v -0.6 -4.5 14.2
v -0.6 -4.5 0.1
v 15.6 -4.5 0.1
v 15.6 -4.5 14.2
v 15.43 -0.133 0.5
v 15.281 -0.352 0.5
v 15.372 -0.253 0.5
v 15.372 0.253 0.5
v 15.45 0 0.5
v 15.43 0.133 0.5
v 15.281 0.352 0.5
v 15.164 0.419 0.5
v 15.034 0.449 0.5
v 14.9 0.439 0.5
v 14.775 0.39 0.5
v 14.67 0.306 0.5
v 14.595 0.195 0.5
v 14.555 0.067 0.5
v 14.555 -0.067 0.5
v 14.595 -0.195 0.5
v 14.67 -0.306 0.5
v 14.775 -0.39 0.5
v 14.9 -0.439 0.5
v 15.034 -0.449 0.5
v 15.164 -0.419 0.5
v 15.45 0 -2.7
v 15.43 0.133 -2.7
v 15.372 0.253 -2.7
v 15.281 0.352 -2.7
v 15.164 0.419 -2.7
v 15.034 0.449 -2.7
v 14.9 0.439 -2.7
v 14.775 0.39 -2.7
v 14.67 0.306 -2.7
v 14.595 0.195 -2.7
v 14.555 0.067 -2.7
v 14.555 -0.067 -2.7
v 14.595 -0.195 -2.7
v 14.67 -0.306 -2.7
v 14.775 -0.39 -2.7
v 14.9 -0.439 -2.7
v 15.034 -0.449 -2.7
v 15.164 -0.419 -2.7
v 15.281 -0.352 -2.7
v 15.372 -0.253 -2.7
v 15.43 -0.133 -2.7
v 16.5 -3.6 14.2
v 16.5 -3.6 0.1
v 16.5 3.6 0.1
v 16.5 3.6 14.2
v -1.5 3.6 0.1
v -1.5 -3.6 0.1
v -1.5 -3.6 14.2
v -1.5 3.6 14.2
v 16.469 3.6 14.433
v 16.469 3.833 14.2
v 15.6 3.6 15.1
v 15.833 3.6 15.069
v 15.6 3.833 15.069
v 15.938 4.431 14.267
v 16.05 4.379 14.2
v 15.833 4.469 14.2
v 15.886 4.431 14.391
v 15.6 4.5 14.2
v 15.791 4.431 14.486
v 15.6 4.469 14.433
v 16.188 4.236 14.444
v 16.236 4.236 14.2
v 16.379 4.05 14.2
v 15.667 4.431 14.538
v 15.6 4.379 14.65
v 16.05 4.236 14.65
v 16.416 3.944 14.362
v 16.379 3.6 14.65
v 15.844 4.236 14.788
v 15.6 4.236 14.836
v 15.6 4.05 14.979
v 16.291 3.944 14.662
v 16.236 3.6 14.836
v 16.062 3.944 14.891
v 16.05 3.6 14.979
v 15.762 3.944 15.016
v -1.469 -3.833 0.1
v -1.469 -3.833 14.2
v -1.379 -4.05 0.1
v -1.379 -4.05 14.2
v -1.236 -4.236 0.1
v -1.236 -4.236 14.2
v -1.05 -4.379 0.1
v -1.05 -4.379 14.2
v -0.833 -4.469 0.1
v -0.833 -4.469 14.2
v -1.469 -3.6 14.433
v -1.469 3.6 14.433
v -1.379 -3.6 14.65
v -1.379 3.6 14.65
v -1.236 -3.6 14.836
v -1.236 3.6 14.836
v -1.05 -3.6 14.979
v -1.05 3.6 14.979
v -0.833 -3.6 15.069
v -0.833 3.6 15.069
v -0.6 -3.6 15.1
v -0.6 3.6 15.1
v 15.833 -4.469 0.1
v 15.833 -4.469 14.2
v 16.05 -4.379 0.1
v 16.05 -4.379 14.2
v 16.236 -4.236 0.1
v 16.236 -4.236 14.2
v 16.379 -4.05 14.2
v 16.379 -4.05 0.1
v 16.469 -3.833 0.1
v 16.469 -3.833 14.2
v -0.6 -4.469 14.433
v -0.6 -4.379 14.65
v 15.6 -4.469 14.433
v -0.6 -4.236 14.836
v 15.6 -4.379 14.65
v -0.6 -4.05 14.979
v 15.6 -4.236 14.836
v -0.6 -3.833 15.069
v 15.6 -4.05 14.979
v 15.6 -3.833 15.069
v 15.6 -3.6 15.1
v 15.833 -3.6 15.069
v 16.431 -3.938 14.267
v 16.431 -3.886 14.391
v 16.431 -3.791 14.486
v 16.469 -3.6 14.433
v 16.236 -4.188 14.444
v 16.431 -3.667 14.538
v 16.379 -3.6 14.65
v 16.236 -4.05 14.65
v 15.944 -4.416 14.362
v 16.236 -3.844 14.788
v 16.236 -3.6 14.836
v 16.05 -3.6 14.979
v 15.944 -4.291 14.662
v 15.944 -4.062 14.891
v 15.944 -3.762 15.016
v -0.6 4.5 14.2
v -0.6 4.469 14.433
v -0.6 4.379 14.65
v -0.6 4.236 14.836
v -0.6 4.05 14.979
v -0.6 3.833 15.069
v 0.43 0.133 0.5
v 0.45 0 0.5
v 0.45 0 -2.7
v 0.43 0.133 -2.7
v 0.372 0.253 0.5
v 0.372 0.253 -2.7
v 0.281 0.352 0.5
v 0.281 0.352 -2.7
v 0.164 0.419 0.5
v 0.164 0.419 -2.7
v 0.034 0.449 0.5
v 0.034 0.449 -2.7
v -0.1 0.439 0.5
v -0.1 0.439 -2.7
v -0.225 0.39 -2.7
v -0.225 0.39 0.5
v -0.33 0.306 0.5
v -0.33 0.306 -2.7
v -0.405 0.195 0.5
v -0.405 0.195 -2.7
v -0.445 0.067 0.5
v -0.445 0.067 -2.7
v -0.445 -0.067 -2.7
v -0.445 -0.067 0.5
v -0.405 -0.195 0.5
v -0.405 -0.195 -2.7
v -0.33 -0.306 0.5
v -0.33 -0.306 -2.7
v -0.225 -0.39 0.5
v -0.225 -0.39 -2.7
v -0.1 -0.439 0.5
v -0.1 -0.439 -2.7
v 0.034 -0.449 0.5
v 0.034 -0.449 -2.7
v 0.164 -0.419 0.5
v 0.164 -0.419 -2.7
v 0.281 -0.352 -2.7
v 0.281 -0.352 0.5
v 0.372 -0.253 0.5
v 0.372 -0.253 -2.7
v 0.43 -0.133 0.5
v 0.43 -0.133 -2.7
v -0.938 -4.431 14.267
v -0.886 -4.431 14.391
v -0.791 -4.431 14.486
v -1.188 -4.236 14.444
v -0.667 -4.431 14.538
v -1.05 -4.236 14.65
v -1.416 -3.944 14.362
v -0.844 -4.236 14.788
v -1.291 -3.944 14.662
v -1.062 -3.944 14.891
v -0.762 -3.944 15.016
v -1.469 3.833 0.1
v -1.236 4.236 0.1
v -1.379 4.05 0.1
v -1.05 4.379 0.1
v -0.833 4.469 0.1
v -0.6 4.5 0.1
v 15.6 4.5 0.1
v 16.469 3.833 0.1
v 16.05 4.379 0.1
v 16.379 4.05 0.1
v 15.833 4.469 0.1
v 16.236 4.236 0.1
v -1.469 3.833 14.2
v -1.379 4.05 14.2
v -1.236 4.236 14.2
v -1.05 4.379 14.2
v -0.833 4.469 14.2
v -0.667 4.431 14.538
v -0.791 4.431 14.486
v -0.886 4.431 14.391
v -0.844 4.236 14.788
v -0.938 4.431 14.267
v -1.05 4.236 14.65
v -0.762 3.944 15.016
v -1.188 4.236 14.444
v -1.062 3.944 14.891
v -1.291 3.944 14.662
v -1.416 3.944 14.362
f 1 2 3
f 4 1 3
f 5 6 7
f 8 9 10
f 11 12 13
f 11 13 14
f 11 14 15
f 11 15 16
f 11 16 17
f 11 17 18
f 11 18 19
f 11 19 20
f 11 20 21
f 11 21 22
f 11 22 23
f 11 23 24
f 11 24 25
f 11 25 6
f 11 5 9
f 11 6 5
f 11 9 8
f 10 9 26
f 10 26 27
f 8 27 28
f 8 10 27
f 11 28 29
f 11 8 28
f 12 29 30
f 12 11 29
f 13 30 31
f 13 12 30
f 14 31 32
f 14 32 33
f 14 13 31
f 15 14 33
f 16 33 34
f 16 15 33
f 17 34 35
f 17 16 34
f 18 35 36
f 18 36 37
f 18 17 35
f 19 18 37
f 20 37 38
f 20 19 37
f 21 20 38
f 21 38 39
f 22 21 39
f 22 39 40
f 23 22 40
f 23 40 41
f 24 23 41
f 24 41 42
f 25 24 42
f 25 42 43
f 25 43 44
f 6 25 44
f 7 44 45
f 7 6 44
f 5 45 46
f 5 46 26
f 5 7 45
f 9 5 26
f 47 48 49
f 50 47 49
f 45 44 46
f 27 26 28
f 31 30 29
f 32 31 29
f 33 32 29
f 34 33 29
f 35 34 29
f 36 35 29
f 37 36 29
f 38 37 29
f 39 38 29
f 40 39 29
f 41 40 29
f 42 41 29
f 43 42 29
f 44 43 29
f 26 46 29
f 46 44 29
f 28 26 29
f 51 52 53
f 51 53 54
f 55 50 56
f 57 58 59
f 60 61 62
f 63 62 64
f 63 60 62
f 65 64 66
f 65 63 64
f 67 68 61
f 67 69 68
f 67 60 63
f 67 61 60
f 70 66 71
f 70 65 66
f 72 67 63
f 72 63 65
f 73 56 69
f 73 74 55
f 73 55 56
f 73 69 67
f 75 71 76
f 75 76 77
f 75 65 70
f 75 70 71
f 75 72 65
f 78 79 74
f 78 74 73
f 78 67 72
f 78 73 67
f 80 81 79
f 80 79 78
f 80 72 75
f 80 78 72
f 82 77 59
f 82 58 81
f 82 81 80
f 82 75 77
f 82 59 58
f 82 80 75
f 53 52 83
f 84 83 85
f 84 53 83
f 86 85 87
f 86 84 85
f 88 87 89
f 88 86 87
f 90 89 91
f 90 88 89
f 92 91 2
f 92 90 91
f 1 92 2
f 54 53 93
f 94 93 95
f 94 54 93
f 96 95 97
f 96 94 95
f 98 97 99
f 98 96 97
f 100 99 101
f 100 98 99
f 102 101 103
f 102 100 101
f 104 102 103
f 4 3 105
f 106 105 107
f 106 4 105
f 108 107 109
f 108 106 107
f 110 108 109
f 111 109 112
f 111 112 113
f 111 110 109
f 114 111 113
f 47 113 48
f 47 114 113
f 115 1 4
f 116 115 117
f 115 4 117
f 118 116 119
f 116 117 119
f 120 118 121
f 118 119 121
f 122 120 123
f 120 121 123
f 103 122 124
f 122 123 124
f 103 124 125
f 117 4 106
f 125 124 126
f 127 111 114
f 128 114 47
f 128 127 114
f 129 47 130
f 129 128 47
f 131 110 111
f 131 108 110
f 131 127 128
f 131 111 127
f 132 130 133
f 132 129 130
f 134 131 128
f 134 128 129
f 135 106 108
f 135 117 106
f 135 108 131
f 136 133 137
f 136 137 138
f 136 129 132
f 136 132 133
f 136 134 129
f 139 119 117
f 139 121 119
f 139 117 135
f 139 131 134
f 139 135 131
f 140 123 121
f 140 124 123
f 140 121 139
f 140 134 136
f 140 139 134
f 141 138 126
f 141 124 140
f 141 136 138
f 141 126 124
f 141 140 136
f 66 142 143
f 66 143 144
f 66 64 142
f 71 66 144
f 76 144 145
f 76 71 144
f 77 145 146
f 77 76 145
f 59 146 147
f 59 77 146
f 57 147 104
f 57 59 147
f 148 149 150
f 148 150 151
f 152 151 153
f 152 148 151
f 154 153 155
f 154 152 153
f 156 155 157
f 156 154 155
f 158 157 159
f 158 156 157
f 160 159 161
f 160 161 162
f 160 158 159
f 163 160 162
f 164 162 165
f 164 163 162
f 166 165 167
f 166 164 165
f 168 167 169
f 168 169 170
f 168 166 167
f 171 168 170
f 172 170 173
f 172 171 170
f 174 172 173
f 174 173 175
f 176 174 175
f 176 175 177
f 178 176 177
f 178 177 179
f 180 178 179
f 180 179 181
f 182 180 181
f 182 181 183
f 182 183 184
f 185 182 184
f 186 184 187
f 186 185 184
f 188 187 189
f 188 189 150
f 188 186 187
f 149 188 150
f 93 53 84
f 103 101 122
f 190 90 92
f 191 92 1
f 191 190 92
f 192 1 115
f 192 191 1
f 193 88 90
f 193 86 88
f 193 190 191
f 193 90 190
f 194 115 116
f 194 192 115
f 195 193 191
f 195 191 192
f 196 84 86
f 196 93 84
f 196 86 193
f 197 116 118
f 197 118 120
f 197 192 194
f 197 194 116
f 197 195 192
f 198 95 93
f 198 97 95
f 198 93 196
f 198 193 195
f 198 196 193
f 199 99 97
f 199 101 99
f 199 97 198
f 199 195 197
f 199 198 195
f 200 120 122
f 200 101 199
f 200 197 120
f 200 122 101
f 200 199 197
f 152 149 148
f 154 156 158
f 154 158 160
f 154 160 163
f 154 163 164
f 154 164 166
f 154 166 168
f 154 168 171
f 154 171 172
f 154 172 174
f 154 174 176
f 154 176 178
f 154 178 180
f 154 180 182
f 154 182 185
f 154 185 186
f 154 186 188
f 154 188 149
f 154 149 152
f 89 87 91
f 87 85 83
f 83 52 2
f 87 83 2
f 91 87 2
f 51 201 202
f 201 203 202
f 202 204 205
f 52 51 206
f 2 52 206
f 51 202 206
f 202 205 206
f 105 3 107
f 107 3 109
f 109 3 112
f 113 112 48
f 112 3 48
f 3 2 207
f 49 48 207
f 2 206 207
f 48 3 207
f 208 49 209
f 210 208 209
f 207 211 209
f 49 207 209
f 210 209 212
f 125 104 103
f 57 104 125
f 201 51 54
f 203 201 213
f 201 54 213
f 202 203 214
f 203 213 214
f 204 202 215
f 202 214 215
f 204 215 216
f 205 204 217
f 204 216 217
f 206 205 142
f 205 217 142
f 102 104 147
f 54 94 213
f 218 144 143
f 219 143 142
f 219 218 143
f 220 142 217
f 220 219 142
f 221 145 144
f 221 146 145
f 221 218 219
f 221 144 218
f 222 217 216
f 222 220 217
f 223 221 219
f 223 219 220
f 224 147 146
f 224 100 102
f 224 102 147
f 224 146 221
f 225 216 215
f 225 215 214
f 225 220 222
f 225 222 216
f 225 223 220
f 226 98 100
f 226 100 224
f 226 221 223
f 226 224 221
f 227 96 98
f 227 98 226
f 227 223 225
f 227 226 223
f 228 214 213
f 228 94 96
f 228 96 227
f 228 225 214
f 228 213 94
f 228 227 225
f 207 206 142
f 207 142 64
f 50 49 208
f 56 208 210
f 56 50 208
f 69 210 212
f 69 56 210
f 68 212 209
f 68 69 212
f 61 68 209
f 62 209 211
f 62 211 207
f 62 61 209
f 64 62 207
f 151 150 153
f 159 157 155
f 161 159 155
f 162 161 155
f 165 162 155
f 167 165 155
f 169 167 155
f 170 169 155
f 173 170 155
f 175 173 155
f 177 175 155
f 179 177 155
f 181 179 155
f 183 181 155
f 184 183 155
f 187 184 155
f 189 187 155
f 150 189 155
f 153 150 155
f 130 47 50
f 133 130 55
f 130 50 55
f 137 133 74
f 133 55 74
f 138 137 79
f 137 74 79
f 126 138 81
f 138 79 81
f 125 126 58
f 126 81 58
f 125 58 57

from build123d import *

# Parameters (mm, degrees)
SKETCH_W     = 18
SKETCH_H     = 9
PAD_DEPTH    = 15
FILLET_R     = 0.9
SKETCH001_R  = 0.45
PAD001_DEPTH = 3.2


with BuildPart() as fillet_body:
    # Sketch → Pad (new body)
    with BuildSketch(Plane.XY.offset(0.1)):
        with Locations((7.5, 0)):
            Rectangle(SKETCH_W, SKETCH_H)
    extrude(amount=PAD_DEPTH)

    # Fillet
    fillet_edges = [fillet_body.edges().sort_by_distance(p)[0] for p in [
        (-1.5, 0, 15.1),
        (-1.5, -4.5, 7.6),
        (7.5, -4.5, 15.1),
        (16.5, -4.5, 7.6),
        (16.5, 0, 15.1),
        (16.5, 4.5, 7.6),
        (7.5, 4.5, 15.1),
        (-1.5, 4.5, 7.6),
    ]]
    fillet(fillet_edges, radius=FILLET_R)


with BuildPart() as pad001:
    # Sketch001 → Pad001 (new body)
    with BuildSketch(Plane.XY.offset(0.5)):
        Circle(SKETCH001_R)
        with Locations((15, 0)):
            Circle(SKETCH001_R)
    extrude(amount=-PAD001_DEPTH)


solid = Compound([fillet_body.part, pad001.part])
